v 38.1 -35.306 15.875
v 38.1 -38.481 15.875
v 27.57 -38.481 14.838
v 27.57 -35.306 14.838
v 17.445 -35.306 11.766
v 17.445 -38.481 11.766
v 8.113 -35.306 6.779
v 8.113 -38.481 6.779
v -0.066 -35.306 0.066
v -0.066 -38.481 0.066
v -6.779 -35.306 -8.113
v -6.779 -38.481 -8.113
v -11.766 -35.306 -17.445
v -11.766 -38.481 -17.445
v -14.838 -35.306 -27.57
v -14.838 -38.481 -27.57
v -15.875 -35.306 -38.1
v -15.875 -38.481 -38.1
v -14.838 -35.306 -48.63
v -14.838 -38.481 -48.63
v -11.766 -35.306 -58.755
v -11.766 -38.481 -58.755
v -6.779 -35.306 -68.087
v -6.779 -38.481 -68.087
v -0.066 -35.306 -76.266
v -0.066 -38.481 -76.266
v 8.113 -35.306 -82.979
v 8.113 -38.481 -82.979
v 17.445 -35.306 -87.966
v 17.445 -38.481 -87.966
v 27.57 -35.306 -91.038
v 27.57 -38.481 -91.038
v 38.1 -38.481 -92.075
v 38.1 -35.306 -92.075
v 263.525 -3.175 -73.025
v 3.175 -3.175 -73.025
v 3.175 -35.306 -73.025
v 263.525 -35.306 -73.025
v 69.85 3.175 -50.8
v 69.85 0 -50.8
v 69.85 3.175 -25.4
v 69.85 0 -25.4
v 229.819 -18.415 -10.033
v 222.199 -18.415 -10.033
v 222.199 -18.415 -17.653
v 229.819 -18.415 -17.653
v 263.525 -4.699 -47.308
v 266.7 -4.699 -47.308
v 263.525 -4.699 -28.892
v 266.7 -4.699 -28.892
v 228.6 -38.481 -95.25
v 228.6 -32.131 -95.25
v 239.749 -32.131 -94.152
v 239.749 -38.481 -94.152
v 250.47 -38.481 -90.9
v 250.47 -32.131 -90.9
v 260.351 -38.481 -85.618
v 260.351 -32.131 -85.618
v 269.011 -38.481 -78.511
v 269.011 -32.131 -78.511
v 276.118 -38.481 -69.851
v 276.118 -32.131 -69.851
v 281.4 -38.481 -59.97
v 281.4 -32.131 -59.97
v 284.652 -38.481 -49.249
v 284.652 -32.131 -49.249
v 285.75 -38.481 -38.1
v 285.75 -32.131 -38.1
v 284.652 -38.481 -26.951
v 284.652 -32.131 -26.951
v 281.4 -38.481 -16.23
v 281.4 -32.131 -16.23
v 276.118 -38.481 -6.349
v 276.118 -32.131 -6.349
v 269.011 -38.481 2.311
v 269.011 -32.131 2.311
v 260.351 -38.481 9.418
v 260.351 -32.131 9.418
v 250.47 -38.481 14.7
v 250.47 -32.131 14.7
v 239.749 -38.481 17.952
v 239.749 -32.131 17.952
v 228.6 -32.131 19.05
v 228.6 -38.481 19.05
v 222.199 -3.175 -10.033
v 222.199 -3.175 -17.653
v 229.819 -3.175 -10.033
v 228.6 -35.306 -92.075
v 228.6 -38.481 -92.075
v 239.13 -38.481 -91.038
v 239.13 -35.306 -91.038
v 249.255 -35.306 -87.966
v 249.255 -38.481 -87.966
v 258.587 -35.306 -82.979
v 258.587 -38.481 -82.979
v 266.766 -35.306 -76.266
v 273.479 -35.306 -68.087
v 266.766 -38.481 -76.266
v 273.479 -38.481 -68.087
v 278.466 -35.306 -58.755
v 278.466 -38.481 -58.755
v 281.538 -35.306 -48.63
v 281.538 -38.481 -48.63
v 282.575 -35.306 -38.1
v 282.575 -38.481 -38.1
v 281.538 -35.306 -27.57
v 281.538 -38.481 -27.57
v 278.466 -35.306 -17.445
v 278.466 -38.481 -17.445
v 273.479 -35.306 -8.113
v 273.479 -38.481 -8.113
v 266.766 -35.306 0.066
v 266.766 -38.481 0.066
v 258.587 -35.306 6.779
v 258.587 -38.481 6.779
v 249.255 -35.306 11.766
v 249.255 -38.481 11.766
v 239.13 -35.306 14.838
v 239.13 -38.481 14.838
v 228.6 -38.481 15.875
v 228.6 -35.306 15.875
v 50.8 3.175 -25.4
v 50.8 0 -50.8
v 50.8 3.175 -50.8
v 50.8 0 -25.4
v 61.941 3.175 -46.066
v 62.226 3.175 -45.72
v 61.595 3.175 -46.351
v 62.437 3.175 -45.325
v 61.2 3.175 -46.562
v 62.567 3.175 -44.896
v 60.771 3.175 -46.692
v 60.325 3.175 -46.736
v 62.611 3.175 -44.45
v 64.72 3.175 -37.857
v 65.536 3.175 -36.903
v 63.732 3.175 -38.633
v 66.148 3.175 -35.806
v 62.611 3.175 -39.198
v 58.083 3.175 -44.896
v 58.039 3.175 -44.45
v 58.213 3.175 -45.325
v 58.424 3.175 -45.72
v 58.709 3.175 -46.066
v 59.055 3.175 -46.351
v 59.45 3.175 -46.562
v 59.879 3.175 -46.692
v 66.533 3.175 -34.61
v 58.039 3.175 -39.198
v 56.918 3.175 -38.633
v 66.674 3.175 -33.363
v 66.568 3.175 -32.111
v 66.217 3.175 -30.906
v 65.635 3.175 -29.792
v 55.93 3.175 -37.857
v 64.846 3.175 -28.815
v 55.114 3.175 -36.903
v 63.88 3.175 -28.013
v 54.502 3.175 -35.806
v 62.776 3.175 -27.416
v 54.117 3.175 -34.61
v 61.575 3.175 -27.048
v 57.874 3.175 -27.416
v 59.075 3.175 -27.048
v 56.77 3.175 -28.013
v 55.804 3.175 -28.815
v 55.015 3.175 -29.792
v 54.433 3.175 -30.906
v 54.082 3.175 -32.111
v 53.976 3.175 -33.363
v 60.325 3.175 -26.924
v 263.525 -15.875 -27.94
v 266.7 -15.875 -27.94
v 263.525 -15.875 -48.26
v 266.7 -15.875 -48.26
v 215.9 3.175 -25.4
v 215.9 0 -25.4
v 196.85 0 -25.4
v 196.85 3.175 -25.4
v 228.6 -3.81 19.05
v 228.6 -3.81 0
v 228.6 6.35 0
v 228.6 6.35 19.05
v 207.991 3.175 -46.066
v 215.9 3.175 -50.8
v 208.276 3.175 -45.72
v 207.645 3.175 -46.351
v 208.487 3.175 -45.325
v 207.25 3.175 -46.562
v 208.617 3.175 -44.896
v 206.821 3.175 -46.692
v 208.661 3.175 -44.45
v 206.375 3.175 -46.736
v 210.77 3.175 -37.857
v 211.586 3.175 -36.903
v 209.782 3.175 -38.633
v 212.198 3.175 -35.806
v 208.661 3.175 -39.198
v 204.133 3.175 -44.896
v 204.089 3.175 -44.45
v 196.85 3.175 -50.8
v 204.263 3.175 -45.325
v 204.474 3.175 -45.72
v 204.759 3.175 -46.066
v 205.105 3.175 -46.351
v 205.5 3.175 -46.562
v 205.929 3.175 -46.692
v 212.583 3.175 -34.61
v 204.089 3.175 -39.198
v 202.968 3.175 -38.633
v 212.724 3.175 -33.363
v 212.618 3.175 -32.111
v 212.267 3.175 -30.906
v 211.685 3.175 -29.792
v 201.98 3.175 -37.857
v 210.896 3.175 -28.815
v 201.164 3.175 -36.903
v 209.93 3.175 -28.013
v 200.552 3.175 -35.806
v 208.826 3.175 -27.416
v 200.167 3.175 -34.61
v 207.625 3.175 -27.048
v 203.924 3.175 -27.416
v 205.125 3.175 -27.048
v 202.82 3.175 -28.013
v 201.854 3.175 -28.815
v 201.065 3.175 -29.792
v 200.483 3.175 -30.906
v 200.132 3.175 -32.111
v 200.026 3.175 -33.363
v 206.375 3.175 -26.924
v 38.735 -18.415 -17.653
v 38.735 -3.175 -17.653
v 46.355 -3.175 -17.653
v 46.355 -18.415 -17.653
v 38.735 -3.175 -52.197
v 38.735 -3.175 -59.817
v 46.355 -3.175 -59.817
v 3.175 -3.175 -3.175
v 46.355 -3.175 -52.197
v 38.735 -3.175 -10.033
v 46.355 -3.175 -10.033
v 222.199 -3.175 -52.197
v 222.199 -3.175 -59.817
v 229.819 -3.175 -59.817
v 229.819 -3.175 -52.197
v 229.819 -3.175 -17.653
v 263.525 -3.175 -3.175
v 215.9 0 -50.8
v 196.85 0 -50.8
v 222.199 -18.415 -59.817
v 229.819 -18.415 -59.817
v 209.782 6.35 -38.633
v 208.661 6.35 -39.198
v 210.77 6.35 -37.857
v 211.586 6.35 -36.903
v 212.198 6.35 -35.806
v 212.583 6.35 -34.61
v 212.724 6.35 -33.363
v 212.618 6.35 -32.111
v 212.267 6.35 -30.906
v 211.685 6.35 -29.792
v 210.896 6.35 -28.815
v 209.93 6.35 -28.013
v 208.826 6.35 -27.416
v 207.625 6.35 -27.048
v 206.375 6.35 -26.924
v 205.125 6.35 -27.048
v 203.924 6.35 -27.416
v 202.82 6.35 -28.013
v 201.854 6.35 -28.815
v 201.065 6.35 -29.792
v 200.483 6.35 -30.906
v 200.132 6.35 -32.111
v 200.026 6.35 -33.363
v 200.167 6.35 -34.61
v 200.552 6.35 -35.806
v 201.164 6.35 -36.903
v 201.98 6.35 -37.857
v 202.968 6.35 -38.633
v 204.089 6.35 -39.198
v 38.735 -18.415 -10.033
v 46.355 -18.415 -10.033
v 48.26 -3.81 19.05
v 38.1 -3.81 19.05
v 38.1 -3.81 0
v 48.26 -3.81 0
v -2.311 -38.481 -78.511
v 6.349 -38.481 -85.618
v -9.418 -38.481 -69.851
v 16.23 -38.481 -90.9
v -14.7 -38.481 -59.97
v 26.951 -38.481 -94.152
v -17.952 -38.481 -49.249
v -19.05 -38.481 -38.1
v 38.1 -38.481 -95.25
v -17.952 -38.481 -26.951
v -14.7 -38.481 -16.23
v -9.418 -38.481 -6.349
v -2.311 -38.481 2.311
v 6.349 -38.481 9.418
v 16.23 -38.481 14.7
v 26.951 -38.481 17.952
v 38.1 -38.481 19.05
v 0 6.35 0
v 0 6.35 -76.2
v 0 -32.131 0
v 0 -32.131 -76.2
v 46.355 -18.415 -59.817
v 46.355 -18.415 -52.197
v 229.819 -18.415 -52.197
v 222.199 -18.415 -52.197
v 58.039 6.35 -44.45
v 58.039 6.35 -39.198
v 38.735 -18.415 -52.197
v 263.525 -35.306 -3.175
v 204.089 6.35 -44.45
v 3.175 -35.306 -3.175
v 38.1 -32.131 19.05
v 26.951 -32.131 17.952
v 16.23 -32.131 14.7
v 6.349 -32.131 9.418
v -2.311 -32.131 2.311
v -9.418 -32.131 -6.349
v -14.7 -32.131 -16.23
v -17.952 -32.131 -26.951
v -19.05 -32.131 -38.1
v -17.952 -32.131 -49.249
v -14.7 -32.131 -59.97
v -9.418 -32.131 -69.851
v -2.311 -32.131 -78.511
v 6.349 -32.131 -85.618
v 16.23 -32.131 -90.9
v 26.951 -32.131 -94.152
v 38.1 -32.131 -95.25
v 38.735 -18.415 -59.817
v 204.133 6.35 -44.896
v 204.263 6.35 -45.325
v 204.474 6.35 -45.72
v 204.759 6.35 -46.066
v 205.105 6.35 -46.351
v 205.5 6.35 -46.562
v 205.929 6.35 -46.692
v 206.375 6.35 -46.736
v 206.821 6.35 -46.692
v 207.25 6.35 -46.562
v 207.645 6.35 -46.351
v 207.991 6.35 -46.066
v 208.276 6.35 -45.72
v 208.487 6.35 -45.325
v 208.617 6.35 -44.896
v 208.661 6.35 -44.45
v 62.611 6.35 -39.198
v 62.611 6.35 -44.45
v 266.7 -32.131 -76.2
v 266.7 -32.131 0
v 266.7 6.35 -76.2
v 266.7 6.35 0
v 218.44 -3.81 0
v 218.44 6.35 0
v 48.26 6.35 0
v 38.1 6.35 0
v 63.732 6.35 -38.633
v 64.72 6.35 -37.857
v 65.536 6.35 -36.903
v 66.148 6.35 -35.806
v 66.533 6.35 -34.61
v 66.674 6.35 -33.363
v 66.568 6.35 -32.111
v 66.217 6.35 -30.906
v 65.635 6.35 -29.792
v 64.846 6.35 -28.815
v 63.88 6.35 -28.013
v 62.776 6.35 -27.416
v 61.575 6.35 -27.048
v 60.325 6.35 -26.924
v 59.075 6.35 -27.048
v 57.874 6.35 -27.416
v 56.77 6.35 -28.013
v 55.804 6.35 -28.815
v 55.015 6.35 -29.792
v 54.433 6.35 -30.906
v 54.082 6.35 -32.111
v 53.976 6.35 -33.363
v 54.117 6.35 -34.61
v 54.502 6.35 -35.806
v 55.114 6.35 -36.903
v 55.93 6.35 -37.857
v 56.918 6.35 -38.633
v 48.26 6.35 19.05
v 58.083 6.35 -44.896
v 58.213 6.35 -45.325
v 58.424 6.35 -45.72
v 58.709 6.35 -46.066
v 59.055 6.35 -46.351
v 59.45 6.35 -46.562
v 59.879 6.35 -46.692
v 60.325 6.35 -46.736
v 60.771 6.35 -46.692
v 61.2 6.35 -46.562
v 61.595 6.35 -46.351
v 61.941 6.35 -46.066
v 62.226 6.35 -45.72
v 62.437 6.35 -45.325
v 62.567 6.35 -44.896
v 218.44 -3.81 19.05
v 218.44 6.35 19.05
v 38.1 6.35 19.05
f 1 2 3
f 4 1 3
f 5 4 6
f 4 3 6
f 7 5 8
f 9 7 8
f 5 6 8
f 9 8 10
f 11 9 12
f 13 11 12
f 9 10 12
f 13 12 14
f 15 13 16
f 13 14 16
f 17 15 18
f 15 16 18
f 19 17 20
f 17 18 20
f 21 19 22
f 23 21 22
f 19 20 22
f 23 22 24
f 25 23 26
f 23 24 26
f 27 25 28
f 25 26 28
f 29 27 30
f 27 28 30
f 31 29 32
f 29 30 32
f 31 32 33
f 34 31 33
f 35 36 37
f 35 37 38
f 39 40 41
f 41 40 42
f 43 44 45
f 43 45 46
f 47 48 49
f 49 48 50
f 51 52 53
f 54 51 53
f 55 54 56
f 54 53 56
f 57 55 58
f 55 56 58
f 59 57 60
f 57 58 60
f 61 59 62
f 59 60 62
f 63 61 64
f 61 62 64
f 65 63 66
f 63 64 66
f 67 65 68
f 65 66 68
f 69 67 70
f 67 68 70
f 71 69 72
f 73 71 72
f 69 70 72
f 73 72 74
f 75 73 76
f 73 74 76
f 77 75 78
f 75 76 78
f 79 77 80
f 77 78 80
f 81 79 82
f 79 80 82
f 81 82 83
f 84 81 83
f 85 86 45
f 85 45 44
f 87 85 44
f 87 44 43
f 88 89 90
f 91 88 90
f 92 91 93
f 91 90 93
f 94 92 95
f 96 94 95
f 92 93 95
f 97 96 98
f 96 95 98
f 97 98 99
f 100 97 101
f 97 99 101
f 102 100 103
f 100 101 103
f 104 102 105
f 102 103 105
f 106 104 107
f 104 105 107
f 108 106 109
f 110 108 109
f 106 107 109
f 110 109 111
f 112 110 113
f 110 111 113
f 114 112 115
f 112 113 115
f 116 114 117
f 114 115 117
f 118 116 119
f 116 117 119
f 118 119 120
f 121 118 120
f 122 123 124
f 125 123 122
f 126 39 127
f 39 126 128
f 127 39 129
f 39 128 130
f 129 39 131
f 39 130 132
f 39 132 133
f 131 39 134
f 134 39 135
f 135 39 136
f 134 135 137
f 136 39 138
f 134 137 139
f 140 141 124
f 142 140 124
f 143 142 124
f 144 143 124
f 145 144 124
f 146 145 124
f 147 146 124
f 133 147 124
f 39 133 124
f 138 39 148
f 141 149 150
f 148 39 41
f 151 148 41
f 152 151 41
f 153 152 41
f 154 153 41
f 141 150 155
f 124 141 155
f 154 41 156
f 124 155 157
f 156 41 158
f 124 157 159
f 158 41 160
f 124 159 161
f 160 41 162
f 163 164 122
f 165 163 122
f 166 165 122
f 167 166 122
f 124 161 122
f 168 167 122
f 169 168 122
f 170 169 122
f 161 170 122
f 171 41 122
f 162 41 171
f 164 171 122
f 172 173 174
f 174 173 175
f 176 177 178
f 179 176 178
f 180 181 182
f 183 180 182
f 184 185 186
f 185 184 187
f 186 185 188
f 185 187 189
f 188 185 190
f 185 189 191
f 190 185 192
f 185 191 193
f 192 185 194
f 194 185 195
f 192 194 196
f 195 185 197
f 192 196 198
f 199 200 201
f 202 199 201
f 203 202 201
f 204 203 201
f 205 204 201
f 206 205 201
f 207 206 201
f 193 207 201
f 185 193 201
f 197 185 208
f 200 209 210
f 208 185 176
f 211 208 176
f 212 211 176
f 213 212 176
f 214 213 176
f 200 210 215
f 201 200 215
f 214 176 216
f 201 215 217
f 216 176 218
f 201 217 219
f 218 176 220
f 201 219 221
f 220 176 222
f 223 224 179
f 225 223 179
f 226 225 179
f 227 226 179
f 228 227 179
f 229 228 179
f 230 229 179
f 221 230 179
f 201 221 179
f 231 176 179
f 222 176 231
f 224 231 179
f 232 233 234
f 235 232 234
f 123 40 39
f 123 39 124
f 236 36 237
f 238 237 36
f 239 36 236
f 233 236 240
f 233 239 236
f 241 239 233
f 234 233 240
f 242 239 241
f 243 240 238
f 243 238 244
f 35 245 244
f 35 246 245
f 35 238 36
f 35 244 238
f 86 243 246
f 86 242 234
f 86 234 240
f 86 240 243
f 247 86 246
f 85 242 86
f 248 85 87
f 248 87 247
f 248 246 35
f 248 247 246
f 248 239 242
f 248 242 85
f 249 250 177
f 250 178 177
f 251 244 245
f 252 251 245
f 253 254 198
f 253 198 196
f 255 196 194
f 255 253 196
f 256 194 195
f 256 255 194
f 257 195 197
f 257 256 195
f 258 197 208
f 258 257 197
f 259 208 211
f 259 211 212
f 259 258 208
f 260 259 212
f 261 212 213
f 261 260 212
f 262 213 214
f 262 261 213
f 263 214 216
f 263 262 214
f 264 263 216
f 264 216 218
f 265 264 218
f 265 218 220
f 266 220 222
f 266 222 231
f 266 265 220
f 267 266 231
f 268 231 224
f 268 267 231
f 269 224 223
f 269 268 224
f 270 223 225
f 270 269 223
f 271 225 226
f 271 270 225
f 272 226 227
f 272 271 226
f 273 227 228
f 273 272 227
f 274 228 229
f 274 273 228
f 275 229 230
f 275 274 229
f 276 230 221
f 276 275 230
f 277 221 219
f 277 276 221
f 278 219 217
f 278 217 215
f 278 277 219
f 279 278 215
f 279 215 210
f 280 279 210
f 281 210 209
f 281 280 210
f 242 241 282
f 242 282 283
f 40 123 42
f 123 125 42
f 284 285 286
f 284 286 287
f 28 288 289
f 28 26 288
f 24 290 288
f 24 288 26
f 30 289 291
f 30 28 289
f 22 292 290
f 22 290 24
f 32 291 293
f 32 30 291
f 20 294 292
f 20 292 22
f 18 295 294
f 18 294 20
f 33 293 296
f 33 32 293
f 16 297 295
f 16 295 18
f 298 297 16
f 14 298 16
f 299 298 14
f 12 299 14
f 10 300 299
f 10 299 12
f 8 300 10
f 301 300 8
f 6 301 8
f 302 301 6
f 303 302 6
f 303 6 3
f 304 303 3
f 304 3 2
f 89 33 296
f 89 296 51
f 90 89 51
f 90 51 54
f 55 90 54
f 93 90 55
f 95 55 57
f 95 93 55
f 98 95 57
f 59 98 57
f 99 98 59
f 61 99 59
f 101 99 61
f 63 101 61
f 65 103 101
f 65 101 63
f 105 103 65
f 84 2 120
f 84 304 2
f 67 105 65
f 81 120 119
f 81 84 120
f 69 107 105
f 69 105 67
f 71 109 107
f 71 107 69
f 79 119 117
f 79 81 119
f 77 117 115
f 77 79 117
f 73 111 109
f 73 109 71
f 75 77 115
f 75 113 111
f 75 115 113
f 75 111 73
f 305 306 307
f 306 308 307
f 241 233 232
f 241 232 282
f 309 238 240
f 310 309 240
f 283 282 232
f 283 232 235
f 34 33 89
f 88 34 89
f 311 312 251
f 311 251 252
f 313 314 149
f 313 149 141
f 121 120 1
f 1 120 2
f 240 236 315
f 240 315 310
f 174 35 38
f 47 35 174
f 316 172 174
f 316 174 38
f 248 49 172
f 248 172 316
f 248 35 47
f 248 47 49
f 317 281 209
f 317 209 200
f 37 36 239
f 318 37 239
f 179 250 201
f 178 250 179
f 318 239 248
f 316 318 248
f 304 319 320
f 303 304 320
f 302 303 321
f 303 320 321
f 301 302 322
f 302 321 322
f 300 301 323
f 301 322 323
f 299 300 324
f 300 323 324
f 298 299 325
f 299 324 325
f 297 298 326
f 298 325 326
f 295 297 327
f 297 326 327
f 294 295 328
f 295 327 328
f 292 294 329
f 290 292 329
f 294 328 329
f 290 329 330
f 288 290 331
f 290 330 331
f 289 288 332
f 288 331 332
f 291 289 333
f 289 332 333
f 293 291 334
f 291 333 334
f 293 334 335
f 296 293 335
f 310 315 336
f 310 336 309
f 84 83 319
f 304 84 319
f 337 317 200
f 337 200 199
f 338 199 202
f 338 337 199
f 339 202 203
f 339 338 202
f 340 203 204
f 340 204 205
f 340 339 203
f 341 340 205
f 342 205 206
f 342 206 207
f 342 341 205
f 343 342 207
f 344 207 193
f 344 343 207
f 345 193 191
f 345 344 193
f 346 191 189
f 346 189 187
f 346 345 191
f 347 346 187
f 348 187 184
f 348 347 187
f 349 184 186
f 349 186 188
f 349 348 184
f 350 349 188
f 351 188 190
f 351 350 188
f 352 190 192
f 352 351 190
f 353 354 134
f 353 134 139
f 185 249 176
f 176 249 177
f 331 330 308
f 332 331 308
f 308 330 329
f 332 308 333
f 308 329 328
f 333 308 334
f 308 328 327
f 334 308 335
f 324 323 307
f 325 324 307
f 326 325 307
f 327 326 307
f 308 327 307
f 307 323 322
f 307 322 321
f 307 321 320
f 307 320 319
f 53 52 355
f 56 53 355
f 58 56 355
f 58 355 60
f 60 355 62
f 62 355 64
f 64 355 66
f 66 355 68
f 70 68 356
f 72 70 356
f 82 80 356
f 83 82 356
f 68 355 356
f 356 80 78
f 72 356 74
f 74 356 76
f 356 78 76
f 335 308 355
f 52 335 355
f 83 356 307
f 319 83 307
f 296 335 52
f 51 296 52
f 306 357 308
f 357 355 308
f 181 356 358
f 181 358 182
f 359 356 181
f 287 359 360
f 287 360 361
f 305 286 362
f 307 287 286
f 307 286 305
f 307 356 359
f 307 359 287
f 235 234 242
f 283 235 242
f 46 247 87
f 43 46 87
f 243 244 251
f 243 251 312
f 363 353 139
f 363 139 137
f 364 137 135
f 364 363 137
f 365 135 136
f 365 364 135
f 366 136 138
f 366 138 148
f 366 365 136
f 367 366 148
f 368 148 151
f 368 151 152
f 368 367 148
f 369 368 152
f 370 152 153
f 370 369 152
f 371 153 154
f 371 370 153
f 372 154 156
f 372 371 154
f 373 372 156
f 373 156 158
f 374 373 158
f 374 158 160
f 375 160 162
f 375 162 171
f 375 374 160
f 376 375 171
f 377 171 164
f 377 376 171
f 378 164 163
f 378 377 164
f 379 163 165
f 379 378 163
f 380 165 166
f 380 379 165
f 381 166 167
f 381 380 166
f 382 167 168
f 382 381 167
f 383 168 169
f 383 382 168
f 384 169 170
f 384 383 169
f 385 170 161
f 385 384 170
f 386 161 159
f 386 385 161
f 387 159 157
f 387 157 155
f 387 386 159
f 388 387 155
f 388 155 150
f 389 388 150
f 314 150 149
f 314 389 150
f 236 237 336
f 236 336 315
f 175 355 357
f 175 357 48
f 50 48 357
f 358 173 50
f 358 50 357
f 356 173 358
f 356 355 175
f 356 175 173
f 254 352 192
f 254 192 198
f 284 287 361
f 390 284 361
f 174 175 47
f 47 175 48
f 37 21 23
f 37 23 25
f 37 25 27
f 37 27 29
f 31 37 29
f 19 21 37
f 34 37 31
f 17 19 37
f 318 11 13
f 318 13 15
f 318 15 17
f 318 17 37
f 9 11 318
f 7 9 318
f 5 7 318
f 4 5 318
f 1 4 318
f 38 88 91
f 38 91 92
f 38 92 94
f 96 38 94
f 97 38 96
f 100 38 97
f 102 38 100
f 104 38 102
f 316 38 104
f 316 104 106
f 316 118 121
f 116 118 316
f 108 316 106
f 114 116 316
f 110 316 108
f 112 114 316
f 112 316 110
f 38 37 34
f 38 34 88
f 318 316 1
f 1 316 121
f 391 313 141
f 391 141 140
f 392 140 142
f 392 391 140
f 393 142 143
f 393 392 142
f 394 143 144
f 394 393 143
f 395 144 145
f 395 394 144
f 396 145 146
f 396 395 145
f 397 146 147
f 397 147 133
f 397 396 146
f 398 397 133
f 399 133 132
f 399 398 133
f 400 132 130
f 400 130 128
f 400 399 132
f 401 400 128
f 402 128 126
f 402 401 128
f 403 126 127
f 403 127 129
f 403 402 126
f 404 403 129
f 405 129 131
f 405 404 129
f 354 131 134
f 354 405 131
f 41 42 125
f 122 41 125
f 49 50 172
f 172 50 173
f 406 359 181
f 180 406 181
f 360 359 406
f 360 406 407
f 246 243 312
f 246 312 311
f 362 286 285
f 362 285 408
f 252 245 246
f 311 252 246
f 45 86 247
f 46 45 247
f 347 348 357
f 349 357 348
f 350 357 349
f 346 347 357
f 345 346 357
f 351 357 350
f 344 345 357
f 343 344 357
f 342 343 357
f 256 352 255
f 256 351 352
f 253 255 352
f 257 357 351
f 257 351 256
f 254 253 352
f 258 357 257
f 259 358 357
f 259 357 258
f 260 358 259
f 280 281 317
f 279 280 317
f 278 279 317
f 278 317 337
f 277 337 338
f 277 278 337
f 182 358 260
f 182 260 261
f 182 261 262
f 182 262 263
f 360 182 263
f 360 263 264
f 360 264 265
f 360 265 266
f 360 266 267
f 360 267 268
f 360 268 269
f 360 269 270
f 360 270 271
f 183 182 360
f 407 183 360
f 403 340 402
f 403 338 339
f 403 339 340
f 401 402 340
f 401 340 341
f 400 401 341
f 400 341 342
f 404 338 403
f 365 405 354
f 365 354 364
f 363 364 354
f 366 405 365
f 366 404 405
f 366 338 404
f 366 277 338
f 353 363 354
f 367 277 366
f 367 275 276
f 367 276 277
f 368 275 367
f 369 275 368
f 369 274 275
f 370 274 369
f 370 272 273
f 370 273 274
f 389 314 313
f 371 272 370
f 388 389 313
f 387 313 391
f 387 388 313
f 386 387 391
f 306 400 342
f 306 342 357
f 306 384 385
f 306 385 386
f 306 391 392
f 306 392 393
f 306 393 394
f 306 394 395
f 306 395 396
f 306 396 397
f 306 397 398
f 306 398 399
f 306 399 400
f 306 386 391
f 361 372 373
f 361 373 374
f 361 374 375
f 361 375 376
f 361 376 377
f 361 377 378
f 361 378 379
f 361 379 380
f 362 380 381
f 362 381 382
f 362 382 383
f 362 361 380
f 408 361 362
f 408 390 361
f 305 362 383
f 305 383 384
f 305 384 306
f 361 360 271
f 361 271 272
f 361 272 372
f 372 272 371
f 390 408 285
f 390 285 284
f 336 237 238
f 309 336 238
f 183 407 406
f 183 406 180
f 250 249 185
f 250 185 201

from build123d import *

# Parameters (mm, degrees)
F0_W      = 266.7
F0_H      = 76.2
F1_DEPTH  = 3.175
F2_W      = 266.7
F2_H      = 76.2
F2_W_2    = 260.35
F2_H_2    = 69.85
F3_DEPTH  = 28.956
F4_W      = 260.35
F4_H      = 69.85
F5_DEPTH  = 6.35
F7_DEPTH  = 3.175
F8_W      = 266.7
F8_H      = 76.2
F8_W_2    = 19.05
F8_H_2    = 25.4
F9_DEPTH  = 6.35
F10_W     = 19.05
F10_H     = 25.4
F11_DEPTH = 3.175
F13_DEPTH = 3.175
F14_W     = 10.16
F14_H     = 10.16
F15_DEPTH = 19.05
F16_W     = 7.62
F16_H     = 7.62
F17_DEPTH = 15.24


with BuildPart() as f1:
    # F0 (on Front) → F1 (new body)
    with BuildSketch(Plane.XZ):
        with Locations((133.35, -38.1)):
            Rectangle(F0_W, F0_H)
    extrude(amount=F1_DEPTH)

    # F2 (on face) → F3 (join)
    with BuildSketch(Plane.XZ.offset(3.175)):
        with Locations((133.35, -38.1)):
            Rectangle(F2_W, F2_H)
        with Locations((133.35, -38.1)):
            Rectangle(F2_W_2, F2_H_2, mode=Mode.SUBTRACT)
    extrude(amount=F3_DEPTH)

    # F4 (on face) → F5 (join)
    with BuildSketch(Plane.XZ.offset(32.131)):
        with BuildLine():
            Line((228.6, 19.05), (38.1, 19.05))
            ThreePointArc((38.1, 19.05), (-19.05, -38.1), (38.1, -95.25))
            Line((38.1, -95.25), (228.6, -95.25))
            ThreePointArc((228.6, -95.25), (285.75, -38.1), (228.6, 19.05))
        make_face()
        with Locations((133.35, -38.1)):
            Rectangle(F4_W, F4_H, mode=Mode.SUBTRACT)
    extrude(amount=F5_DEPTH)

    # F6 (on face) → F7 (cut)
    with BuildSketch(Plane.XZ.offset(38.481)):
        with BuildLine():
            Line((228.6, 15.875), (38.1, 15.875))
            ThreePointArc((38.1, 15.875), (-15.875, -38.1), (38.1, -92.075))
            Line((38.1, -92.075), (228.6, -92.075))
            ThreePointArc((228.6, -92.075), (282.575, -38.1), (228.6, 15.875))
        make_face()
    extrude(amount=-F7_DEPTH, mode=Mode.SUBTRACT)

    # F8 (on face) → F9 (join)
    with BuildSketch(Plane(origin=(0, 0, 0), x_dir=(-1, 0, 0), z_dir=(0, 1, 0))):
        with Locations((-133.35, -38.1)):
            Rectangle(F8_W, F8_H)
        with Locations((-206.375, -38.1)):
            Rectangle(F8_W_2, F8_H_2, mode=Mode.SUBTRACT)
        with Locations((-60.325, -38.1)):
            Rectangle(F8_W_2, F8_H_2, mode=Mode.SUBTRACT)
    extrude(amount=F9_DEPTH)

    # F10 (on face) → F11 (join)
    with BuildSketch(Plane(origin=(0, 6.35, 0), x_dir=(-1, 0, 0), z_dir=(0, 1, 0))):
        with Locations((-60.325, -38.1)):
            Rectangle(F10_W, F10_H)
        with BuildLine():
            ThreePointArc((-62.611, -39.198247), (-60.325, -26.924), (-58.039, -39.198247))
            Line((-58.039, -39.198247), (-58.039, -44.45))
            ThreePointArc((-58.039, -44.45), (-60.325, -46.736), (-62.611, -44.45))
            Line((-62.611, -44.45), (-62.611, -39.198247))
        make_face(mode=Mode.SUBTRACT)
        with Locations((-206.375, -38.1)):
            Rectangle(F10_W, F10_H)
        with BuildLine():
            ThreePointArc((-208.661, -39.198247), (-206.375, -26.924), (-204.089, -39.198247))
            Line((-204.089, -39.198247), (-204.089, -44.45))
            ThreePointArc((-204.089, -44.45), (-206.375, -46.736), (-208.661, -44.45))
            Line((-208.661, -44.45), (-208.661, -39.198247))
        make_face(mode=Mode.SUBTRACT)
    extrude(amount=-F11_DEPTH)

    # F12 (on face) → F13 (cut, through all)
    with BuildSketch(Plane.YZ.offset(266.7)):
        Polygon((-4.699, -47.3075), (-4.699, -28.8925), (-15.875, -27.94), (-15.875, -48.26), align=None)
    extrude(amount=-F13_DEPTH, mode=Mode.SUBTRACT)

    # F14 (on face) → F15 (join, through all)
    with BuildSketch(Plane.XY):
        with Locations((43.18, 1.27)):
            Rectangle(F14_W, F14_H)
        with Locations((223.52, 1.27)):
            Rectangle(F14_W, F14_H)
    extrude(amount=F15_DEPTH)

    # F16 (on face) → F17 (join)
    with BuildSketch(Plane.XZ.offset(3.175)):
        with Locations((226.0092, -56.007)):
            Rectangle(F16_W, F16_H)
        with Locations((226.0092, -13.843)):
            Rectangle(F16_W, F16_H)
        with Locations((42.545, -56.007)):
            Rectangle(F16_W, F16_H)
        with Locations((42.545, -13.843)):
            Rectangle(F16_W, F16_H)
    extrude(amount=F17_DEPTH)


solid = f1.part
